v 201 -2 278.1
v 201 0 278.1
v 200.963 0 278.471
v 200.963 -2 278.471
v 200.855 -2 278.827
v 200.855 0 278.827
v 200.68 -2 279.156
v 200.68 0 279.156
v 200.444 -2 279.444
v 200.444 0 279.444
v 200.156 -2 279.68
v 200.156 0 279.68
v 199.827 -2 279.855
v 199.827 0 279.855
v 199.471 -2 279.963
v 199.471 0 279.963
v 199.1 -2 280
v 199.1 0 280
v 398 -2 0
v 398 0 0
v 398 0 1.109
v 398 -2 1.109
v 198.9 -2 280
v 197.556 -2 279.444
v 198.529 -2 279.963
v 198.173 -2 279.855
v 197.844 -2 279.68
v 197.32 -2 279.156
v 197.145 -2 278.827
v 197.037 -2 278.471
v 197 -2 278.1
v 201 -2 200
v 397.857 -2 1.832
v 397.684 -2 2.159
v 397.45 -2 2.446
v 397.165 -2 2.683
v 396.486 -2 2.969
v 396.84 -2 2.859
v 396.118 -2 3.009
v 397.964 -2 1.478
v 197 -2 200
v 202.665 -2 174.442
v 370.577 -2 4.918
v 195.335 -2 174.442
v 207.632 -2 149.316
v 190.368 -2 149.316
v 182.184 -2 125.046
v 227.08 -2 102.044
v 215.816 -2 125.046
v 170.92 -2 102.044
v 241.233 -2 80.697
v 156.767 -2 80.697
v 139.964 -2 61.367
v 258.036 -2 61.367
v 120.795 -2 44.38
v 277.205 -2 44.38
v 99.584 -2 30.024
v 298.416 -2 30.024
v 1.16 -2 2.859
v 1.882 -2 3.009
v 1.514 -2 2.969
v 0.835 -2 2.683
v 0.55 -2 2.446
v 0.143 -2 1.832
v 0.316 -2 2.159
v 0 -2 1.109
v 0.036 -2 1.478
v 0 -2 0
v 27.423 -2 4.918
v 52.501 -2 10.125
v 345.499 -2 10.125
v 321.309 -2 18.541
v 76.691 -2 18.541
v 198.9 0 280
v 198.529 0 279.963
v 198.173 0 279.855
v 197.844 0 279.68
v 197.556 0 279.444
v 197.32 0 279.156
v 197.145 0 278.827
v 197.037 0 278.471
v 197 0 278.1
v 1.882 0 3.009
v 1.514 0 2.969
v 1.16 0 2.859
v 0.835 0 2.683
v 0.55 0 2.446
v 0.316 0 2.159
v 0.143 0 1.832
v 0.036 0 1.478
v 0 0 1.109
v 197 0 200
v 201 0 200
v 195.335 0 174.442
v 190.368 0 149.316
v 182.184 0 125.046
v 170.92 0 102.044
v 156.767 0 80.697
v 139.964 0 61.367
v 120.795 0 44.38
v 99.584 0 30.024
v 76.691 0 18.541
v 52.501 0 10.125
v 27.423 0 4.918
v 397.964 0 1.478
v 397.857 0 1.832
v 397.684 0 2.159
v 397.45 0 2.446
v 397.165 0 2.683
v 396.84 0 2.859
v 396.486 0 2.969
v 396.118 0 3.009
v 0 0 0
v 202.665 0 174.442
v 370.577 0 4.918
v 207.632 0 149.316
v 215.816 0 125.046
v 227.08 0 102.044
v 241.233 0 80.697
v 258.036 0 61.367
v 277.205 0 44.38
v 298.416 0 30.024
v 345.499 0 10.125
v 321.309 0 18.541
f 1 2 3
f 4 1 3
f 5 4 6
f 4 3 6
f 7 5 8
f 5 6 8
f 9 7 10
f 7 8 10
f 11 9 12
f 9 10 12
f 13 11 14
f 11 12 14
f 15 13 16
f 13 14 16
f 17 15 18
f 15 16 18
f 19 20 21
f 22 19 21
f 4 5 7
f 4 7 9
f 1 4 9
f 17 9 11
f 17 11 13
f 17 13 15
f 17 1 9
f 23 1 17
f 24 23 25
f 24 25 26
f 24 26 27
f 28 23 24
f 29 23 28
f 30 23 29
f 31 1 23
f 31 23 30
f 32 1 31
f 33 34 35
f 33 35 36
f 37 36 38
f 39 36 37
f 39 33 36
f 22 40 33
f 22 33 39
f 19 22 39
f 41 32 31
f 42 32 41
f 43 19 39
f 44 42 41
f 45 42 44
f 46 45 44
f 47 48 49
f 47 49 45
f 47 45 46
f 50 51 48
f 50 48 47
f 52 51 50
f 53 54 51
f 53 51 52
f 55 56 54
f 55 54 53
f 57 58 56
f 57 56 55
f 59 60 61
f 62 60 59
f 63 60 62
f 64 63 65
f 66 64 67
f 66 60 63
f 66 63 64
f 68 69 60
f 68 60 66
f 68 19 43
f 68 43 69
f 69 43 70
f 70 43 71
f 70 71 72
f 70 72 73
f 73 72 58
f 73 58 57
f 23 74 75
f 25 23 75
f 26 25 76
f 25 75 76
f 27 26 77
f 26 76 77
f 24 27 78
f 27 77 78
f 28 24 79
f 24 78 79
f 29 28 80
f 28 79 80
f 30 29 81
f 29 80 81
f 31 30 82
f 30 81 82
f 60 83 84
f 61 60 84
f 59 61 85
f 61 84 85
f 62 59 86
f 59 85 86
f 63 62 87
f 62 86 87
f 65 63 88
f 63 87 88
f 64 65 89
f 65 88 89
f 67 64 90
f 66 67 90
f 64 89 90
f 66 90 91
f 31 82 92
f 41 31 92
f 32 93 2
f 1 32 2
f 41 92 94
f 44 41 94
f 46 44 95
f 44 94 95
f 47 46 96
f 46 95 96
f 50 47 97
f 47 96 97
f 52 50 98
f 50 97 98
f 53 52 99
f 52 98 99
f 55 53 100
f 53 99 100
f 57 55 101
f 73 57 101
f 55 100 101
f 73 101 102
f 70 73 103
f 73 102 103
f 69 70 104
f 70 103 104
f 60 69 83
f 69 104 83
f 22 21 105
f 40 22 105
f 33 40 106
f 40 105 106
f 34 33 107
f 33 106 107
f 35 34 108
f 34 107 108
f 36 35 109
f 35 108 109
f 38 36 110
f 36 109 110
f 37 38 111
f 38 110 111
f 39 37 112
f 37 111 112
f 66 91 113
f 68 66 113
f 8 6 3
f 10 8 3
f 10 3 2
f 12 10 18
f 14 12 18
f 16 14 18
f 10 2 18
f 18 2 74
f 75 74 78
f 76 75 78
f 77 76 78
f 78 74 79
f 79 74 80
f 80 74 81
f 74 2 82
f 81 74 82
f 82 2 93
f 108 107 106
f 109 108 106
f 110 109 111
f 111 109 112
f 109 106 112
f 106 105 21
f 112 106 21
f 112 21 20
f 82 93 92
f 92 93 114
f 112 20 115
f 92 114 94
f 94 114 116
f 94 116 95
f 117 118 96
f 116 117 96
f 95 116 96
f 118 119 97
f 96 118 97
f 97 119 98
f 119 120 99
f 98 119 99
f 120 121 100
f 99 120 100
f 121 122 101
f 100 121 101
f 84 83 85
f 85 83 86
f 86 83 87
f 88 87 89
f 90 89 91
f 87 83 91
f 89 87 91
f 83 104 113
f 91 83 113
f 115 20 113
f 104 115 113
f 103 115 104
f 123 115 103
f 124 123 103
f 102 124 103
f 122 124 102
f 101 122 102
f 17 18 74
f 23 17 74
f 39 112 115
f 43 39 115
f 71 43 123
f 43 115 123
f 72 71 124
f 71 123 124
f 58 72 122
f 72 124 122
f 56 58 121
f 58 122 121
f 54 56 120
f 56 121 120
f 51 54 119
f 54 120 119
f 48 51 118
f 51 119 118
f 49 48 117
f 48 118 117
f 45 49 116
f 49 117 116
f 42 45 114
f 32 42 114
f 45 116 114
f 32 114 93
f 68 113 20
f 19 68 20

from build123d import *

# Parameters (mm, degrees)
BASE_FLANGE1_DEPTH = 2


# Sheet-metal steps are written as plain solids
with BuildPart() as part:
    # Sketch1 → Base-Flange1 (new body)
    with BuildSketch(Plane(origin=(0, 0, 0), x_dir=(1, 0, 0), z_dir=(0, 1, 0))):
        with BuildLine():
            Line((0, 0), (398, 0))
            Line((398, 0), (398, -1.109075119))
            ThreePointArc((398, -1.109075119), (397.449904564, -2.446145673), (396.118149824, -3.008988429))
            ThreePointArc((396.118149824, -3.008988429), (258.03621096, -61.36689516), (201, -200))
            Line((201, -200), (201, -278.1))
            ThreePointArc((201, -278.1), (200.443502884, -279.443502884), (199.1, -280))
            Line((199.1, -280), (199, -280))
            Line((199, -280), (198.9, -280))
            ThreePointArc((198.9, -280), (197.556497116, -279.443502884), (197, -278.1))
            Line((197, -278.1), (197, -200))
            ThreePointArc((197, -200), (139.96378904, -61.36689516), (1.881850176, -3.008988429))
            ThreePointArc((1.881850176, -3.008988429), (0.550095436, -2.446145673), (0, -1.109075119))
            Line((0, -1.109075119), (0, 0))
        make_face()
    extrude(amount=-BASE_FLANGE1_DEPTH)


solid = part.part
